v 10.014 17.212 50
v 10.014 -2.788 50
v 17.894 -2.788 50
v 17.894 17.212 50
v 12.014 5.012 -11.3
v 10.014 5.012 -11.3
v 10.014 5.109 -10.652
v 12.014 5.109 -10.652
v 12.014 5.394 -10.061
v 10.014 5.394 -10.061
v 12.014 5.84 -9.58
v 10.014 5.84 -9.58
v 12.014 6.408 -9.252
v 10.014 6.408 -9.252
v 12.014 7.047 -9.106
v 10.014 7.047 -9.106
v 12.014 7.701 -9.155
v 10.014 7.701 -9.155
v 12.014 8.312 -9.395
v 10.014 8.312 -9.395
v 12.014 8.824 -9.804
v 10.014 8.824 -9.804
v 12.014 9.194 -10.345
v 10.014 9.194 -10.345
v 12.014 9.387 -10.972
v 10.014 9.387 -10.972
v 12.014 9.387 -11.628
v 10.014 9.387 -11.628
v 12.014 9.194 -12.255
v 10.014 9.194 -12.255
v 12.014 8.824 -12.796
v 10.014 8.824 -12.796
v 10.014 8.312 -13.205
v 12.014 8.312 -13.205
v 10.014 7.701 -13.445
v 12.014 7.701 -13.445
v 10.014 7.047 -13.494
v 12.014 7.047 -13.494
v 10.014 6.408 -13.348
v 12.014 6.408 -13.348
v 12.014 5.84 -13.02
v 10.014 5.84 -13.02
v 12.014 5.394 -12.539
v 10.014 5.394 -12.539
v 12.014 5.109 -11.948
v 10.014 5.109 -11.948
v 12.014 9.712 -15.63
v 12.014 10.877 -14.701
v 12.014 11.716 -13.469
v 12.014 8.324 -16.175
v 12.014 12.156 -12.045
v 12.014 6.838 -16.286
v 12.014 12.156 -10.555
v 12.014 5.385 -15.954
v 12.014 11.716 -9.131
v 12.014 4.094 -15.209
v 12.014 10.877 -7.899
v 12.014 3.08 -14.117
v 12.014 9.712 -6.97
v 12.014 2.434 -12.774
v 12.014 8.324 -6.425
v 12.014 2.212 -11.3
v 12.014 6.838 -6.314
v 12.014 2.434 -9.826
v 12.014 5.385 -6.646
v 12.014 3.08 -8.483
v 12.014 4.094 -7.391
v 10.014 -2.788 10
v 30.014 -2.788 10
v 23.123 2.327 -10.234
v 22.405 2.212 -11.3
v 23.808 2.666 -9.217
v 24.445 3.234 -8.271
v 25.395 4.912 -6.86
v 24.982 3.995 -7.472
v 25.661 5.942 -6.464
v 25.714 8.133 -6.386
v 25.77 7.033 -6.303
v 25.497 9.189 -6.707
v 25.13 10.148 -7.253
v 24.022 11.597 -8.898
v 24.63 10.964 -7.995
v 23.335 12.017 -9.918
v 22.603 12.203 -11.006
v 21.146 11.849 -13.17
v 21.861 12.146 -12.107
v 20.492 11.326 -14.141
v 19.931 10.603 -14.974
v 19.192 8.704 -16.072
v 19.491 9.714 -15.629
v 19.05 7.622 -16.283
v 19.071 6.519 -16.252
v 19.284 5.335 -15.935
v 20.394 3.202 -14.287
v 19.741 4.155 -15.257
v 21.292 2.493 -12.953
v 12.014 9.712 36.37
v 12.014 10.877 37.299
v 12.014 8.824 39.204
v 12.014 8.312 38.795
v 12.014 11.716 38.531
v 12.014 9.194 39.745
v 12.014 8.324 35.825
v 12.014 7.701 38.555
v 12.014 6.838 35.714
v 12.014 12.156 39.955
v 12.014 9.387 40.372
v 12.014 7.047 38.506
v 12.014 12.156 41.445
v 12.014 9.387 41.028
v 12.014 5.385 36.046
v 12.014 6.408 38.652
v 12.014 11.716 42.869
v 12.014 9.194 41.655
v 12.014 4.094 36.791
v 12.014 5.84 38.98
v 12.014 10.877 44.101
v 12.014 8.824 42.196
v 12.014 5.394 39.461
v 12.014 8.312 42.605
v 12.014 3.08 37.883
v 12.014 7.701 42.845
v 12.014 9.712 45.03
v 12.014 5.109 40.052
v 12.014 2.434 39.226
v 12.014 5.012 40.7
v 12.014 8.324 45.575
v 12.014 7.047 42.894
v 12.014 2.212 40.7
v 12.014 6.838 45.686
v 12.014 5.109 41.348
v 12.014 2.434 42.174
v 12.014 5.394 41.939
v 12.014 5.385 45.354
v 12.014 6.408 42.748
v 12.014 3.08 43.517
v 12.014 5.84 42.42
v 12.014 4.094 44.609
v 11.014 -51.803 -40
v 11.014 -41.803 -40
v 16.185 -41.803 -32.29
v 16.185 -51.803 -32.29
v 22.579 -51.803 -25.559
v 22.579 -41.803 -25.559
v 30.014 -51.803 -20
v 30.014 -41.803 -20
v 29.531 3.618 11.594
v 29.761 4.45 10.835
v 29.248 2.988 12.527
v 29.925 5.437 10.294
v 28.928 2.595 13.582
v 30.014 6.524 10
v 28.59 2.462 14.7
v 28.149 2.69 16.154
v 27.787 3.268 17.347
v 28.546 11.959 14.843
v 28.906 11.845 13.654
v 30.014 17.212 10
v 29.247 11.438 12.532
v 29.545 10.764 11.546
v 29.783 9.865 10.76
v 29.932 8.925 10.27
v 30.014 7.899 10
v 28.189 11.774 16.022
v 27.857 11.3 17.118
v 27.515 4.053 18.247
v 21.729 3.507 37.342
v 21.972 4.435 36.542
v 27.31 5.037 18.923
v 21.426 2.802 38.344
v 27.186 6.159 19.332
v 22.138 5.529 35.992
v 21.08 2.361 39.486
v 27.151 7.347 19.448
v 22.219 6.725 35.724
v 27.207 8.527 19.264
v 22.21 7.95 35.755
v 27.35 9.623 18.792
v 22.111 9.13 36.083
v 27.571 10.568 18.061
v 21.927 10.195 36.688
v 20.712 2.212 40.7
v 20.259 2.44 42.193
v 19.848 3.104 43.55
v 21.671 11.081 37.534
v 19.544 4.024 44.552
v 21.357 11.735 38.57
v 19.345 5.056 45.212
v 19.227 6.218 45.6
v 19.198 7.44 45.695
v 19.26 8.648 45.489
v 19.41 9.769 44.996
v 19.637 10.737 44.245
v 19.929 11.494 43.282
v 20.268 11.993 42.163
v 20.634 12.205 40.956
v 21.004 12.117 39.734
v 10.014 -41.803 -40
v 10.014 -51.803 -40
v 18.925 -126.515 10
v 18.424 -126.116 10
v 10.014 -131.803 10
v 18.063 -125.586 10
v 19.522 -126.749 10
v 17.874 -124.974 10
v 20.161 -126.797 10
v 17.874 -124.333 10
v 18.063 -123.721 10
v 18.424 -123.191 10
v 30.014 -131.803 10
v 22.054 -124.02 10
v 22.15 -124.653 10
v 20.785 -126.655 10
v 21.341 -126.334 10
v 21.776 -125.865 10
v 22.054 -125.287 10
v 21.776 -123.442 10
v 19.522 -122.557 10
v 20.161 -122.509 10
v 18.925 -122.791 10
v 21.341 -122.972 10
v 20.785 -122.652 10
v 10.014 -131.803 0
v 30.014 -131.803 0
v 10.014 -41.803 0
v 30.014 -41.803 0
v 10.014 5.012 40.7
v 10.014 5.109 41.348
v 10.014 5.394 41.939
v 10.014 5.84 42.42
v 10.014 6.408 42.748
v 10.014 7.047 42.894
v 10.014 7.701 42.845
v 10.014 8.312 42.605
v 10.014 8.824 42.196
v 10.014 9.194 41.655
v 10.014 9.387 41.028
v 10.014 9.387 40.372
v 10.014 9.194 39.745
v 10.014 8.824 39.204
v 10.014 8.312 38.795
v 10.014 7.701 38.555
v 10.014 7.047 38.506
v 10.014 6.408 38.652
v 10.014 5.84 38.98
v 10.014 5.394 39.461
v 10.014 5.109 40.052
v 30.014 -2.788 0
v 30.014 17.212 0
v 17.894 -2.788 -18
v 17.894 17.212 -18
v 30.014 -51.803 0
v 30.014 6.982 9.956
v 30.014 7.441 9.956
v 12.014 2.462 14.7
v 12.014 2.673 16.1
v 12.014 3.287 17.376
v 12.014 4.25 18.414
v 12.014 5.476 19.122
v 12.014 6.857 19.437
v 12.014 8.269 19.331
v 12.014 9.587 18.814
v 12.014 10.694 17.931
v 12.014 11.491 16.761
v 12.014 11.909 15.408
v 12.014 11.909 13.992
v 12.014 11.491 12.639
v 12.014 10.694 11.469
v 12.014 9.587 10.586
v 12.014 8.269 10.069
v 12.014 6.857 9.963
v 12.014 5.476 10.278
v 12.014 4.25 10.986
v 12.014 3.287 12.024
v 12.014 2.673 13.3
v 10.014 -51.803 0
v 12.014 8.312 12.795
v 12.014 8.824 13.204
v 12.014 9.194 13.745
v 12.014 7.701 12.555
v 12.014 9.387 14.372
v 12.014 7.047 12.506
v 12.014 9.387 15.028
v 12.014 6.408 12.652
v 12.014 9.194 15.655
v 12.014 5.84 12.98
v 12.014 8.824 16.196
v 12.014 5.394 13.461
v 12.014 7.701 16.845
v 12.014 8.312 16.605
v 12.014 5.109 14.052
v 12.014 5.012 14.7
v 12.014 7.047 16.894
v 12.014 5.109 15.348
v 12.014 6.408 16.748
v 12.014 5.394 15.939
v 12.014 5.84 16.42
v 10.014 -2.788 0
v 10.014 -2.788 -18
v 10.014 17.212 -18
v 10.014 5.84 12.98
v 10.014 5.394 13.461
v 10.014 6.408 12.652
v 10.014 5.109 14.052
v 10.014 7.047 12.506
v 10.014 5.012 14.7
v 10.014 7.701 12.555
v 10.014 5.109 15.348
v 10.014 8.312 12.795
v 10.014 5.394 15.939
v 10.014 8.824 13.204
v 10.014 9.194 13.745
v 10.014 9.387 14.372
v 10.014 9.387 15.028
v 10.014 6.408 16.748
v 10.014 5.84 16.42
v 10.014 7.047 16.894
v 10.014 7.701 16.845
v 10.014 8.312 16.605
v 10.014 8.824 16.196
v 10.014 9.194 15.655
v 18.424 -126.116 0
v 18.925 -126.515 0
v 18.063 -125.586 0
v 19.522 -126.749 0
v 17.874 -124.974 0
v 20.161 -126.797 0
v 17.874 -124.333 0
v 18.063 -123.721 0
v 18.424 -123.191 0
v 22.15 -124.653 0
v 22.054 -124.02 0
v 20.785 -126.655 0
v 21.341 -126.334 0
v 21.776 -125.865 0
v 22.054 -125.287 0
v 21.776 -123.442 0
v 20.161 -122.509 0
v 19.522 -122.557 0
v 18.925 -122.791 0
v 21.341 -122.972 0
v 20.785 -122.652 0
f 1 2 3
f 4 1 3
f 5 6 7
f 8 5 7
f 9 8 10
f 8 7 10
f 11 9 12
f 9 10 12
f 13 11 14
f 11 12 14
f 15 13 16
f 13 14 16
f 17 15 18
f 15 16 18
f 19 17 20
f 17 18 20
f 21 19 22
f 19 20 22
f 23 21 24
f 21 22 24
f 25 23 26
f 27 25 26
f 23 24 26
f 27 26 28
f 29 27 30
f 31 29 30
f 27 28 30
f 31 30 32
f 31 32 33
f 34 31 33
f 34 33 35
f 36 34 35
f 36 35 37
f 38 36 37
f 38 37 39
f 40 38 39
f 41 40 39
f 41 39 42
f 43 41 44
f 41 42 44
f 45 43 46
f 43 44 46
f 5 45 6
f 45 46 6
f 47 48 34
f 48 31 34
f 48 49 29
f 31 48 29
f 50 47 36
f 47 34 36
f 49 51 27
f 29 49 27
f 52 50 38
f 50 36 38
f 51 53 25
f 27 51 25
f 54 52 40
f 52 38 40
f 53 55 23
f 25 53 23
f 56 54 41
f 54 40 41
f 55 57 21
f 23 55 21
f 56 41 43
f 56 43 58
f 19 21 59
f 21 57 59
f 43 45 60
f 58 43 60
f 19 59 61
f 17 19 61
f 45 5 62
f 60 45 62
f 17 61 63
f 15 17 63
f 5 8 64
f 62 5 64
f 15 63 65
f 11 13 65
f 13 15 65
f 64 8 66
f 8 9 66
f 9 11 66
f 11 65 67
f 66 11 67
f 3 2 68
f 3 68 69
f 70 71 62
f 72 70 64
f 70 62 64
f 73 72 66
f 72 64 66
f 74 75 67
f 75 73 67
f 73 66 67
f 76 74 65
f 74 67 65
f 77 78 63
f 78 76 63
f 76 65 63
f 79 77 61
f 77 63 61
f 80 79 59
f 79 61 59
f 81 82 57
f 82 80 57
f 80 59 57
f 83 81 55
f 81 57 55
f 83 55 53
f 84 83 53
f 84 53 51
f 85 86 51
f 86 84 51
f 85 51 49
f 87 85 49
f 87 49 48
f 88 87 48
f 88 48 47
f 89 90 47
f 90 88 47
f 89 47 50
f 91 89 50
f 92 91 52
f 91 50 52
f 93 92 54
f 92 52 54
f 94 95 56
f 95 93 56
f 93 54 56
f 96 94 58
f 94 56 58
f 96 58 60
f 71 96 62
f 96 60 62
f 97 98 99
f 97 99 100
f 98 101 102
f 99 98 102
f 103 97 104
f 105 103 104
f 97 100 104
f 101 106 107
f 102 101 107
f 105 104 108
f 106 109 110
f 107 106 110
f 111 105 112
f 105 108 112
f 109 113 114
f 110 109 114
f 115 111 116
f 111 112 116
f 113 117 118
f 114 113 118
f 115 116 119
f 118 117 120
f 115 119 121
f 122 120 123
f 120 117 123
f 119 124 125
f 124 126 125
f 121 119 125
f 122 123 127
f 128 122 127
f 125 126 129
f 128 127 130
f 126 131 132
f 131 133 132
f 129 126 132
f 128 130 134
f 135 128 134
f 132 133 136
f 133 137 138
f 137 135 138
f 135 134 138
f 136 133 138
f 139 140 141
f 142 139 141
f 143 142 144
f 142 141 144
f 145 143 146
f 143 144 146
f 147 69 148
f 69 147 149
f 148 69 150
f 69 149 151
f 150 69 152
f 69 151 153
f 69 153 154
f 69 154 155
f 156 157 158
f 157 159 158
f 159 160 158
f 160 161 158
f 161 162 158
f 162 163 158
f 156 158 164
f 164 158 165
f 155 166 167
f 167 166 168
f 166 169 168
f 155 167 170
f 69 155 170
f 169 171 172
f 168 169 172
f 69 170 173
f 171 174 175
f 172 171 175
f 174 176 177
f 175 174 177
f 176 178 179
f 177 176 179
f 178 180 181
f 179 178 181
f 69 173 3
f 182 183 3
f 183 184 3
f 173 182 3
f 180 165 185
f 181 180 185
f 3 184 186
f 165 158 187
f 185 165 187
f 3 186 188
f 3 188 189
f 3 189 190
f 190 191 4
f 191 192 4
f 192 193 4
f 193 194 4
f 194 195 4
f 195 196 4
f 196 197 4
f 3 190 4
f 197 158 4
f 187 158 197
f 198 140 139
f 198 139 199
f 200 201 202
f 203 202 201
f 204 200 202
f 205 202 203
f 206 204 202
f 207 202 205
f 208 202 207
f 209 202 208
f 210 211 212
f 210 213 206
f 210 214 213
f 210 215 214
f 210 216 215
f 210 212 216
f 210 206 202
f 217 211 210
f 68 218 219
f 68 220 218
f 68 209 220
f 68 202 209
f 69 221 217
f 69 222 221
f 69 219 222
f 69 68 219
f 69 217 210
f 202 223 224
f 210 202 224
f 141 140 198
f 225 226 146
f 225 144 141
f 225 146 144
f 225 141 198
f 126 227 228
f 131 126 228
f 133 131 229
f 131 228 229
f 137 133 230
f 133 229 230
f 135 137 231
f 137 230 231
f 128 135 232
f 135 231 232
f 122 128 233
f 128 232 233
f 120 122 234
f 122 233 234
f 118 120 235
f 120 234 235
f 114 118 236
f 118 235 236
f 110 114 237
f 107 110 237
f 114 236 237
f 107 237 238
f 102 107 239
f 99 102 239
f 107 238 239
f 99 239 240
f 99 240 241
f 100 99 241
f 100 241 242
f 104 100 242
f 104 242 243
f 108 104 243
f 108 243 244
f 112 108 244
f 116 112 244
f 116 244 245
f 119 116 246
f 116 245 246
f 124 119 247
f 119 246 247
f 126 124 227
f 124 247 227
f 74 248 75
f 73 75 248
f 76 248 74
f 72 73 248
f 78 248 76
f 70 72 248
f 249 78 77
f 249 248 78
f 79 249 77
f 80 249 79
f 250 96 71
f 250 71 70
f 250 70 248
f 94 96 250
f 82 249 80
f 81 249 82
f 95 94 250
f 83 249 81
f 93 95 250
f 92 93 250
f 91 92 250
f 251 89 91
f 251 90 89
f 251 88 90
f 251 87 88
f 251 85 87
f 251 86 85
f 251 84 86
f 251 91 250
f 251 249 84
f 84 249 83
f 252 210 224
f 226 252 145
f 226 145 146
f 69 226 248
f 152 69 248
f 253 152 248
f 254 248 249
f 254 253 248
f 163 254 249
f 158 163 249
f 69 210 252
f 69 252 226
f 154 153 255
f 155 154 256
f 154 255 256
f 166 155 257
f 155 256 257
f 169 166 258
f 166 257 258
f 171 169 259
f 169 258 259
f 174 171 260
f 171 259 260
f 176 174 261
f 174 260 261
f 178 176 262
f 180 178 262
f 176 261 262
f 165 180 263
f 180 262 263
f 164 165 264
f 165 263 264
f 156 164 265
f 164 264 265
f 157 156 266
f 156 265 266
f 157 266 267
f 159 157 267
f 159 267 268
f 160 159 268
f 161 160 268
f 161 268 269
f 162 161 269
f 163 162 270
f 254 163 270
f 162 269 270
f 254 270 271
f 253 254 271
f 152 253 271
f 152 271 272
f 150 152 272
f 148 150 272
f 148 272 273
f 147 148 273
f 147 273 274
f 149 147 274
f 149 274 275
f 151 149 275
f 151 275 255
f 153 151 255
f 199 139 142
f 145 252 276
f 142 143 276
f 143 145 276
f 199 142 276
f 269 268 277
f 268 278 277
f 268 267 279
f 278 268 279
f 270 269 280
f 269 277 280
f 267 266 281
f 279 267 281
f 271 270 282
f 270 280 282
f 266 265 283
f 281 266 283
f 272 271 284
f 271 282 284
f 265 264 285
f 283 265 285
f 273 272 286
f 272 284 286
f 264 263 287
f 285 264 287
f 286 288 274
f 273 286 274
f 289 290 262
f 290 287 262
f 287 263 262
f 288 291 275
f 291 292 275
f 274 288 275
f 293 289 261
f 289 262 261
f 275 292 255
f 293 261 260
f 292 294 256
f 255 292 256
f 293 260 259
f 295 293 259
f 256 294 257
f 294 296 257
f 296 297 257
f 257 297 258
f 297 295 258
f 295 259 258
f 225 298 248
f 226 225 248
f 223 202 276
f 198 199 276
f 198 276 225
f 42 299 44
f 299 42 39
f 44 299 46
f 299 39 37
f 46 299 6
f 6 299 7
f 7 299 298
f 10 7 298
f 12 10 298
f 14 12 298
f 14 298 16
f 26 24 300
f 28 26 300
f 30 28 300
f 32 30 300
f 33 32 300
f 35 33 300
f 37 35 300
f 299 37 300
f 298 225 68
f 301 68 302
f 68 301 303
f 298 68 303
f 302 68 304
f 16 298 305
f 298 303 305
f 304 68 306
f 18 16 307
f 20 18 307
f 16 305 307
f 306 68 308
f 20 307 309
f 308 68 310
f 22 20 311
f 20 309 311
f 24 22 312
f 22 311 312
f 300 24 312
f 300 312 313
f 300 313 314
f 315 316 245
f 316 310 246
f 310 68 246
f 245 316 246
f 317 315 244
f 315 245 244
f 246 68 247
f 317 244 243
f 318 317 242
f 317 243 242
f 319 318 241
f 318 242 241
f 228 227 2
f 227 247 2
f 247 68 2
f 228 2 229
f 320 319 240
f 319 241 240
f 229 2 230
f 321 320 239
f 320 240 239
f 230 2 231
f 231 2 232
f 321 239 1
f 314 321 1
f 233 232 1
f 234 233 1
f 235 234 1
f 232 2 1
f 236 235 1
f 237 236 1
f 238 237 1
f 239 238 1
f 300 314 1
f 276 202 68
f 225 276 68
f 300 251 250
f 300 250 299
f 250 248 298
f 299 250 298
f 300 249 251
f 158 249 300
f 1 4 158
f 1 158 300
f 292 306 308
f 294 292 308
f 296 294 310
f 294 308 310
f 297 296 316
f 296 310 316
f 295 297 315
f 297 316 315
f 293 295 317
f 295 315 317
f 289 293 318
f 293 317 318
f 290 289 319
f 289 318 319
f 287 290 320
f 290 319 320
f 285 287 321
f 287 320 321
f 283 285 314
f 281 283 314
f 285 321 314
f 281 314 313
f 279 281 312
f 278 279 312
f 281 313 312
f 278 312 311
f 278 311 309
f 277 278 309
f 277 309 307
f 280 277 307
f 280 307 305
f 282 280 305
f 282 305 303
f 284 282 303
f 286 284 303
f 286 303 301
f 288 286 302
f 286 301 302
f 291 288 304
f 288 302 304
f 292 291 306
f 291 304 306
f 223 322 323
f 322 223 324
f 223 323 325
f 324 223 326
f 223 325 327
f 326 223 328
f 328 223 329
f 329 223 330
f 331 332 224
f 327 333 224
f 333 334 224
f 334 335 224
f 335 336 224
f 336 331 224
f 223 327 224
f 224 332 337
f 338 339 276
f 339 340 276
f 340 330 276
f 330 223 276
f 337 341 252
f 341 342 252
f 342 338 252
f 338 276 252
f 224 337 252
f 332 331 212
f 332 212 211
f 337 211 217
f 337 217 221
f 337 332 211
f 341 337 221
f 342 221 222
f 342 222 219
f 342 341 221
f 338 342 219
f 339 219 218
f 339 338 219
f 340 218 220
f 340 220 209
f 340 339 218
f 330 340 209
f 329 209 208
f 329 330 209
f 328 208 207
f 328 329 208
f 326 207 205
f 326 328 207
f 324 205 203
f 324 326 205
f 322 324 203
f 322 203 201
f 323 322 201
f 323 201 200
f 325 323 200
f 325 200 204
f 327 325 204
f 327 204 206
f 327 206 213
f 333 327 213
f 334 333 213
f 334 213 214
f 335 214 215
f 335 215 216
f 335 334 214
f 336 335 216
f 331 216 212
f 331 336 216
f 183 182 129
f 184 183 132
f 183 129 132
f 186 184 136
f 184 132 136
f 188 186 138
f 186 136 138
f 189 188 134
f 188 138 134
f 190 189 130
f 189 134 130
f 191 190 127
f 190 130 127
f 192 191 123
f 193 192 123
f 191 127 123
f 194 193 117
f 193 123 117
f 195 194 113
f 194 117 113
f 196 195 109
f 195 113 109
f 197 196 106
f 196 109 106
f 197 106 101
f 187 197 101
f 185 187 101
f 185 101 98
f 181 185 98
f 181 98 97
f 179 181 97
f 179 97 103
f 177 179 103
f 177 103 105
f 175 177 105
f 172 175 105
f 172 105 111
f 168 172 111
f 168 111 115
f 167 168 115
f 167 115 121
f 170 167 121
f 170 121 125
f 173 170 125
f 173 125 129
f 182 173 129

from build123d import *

# Parameters (mm, degrees)
SKETCH_1_W               = 20
SKETCH_1_H               = 149.015
SKETCH_1_R               = 2.15
EXTRUDE_1_DEPTH          = 10
SKETCH_2_W               = 20
SKETCH_2_H               = 20
EXTRUDE_2_DEPTH          = 40
SKETCH_3_W               = 20
SKETCH_3_H               = 20
EXTRUDE_3_DEPTH          = 18
CUT_EXTRUDE_1_DEPTH      = 10
CUT_EXTRUDE_1_DEPTH_BACK = 20
SKETCH_5_R               = 2.2
CUT_EXTRUDE_2_DEPTH      = 2
CUT_EXTRUDE_START        = -2
SKETCH_6_R               = 5
SKETCH_6_R_2             = 4.75
CUT_EXTRUDE_3_DEPTH      = 20
SKETCH_7_W               = 20
SKETCH_7_H               = 10
EXTRUDE_4_DEPTH          = 40
CUT_EXTRUDE_5_REACH      = 109.242


with BuildPart() as part:
    # 草图1 → 凸台-拉伸1 (new body)
    with BuildSketch(Plane.XY):
        with Locations((20.013762606, -57.295888527)):
            Rectangle(SKETCH_1_W, SKETCH_1_H)
        with Locations((20, -124.653388527)):
            Circle(SKETCH_1_R, mode=Mode.SUBTRACT)
    extrude(amount=EXTRUDE_1_DEPTH)

    # 草图2 → 凸台-拉伸2 (add)
    with BuildSketch(Plane.XY.offset(10)):
        with Locations((20.013762606, 7.211611473)):
            Rectangle(SKETCH_2_W, SKETCH_2_H)
    extrude(amount=EXTRUDE_2_DEPTH)

    # 草图3 → 凸台-拉伸3 (add)
    with BuildSketch(Plane(origin=(0, 0, 0), x_dir=(-1, 0, 0), z_dir=(0, 0, -1))):
        with Locations((-20.013762606, 7.211611473)):
            Rectangle(SKETCH_3_W, SKETCH_3_H)
    extrude(amount=EXTRUDE_3_DEPTH)

    # 草图4 → 切除-拉伸1 (cut, two sides: drawn at the far end of the back side and taken through both)
    with BuildSketch(Plane.XZ.offset(2.788388527).offset(-CUT_EXTRUDE_1_DEPTH_BACK)):
        Polygon((17.893762606, 50), (30.013762606, 50), (30.013762606, 10), align=None)
        Polygon((17.893762606, -18), (30.013762606, -18), (30.013762606, 0), align=None)
    extrude(amount=CUT_EXTRUDE_1_DEPTH + CUT_EXTRUDE_1_DEPTH_BACK, mode=Mode.SUBTRACT)

    # 草图5 → 切除-拉伸2 (cut)
    with BuildSketch(Plane.ZY.offset(-10.013762606)):
        with Locations(Location((14.7, 7.211611473, 0), (0, 0, 270))):
            Circle(SKETCH_5_R)
        with Locations(Location((40.7, 7.211611473, 0), (0, 0, 270))):
            Circle(SKETCH_5_R)
        with Locations(Location((-11.3, 7.211611473, 0), (0, 0, 270))):
            Circle(SKETCH_5_R)
    extrude(amount=-CUT_EXTRUDE_2_DEPTH, mode=Mode.SUBTRACT)

    # 草图6 → 切除-拉伸3 (cut)
    with BuildSketch(Plane.ZY.offset(-10.013762606).offset(CUT_EXTRUDE_START)):
        with Locations(Location((40.7, 7.211611473, 0), (0, 0, 270))):
            Circle(SKETCH_6_R)
        with Locations(Location((-11.3, 7.211611473, 0), (0, 0, 270))):
            Circle(SKETCH_6_R)
        with Locations(Location((14.7, 7.211611473, 0), (0, 0, 270))):
            Circle(SKETCH_6_R_2)
    extrude(amount=-CUT_EXTRUDE_3_DEPTH, mode=Mode.SUBTRACT)

    # 草图7 → 凸台-拉伸4 (add)
    with BuildSketch(Plane(origin=(0, 0, 0), x_dir=(-1, 0, 0), z_dir=(0, 0, -1))):
        with Locations((-20.013762606, -46.803388527)):
            Rectangle(SKETCH_7_W, SKETCH_7_H)
    extrude(amount=EXTRUDE_4_DEPTH)

    # 草图8 → 切除-拉伸5 (cut, up to next)
    with BuildSketch(Plane(origin=(0, -41.803388527, 0), x_dir=(1, 0, 0), z_dir=(0, 1, 0)), mode=Mode.PRIVATE) as cut_extrude_5_sk1:
        with BuildLine():
            Line((30.013762606, 20), (30.013762606, 40))
            Line((30.013762606, 40), (11.013762606, 40))
            ThreePointArc((11.013762606, 40), (19.239482102, 28.789433521), (30.013762606, 20))
        make_face()
    cut_extrude_5_tool1 = extrude(cut_extrude_5_sk1.sketch, amount=-CUT_EXTRUDE_5_REACH, mode=Mode.PRIVATE) & part.part
    add(cut_extrude_5_tool1.solids().sort_by_distance((23.14433, -41.803389, -32.776655))[0], mode=Mode.SUBTRACT)


solid = part.part
